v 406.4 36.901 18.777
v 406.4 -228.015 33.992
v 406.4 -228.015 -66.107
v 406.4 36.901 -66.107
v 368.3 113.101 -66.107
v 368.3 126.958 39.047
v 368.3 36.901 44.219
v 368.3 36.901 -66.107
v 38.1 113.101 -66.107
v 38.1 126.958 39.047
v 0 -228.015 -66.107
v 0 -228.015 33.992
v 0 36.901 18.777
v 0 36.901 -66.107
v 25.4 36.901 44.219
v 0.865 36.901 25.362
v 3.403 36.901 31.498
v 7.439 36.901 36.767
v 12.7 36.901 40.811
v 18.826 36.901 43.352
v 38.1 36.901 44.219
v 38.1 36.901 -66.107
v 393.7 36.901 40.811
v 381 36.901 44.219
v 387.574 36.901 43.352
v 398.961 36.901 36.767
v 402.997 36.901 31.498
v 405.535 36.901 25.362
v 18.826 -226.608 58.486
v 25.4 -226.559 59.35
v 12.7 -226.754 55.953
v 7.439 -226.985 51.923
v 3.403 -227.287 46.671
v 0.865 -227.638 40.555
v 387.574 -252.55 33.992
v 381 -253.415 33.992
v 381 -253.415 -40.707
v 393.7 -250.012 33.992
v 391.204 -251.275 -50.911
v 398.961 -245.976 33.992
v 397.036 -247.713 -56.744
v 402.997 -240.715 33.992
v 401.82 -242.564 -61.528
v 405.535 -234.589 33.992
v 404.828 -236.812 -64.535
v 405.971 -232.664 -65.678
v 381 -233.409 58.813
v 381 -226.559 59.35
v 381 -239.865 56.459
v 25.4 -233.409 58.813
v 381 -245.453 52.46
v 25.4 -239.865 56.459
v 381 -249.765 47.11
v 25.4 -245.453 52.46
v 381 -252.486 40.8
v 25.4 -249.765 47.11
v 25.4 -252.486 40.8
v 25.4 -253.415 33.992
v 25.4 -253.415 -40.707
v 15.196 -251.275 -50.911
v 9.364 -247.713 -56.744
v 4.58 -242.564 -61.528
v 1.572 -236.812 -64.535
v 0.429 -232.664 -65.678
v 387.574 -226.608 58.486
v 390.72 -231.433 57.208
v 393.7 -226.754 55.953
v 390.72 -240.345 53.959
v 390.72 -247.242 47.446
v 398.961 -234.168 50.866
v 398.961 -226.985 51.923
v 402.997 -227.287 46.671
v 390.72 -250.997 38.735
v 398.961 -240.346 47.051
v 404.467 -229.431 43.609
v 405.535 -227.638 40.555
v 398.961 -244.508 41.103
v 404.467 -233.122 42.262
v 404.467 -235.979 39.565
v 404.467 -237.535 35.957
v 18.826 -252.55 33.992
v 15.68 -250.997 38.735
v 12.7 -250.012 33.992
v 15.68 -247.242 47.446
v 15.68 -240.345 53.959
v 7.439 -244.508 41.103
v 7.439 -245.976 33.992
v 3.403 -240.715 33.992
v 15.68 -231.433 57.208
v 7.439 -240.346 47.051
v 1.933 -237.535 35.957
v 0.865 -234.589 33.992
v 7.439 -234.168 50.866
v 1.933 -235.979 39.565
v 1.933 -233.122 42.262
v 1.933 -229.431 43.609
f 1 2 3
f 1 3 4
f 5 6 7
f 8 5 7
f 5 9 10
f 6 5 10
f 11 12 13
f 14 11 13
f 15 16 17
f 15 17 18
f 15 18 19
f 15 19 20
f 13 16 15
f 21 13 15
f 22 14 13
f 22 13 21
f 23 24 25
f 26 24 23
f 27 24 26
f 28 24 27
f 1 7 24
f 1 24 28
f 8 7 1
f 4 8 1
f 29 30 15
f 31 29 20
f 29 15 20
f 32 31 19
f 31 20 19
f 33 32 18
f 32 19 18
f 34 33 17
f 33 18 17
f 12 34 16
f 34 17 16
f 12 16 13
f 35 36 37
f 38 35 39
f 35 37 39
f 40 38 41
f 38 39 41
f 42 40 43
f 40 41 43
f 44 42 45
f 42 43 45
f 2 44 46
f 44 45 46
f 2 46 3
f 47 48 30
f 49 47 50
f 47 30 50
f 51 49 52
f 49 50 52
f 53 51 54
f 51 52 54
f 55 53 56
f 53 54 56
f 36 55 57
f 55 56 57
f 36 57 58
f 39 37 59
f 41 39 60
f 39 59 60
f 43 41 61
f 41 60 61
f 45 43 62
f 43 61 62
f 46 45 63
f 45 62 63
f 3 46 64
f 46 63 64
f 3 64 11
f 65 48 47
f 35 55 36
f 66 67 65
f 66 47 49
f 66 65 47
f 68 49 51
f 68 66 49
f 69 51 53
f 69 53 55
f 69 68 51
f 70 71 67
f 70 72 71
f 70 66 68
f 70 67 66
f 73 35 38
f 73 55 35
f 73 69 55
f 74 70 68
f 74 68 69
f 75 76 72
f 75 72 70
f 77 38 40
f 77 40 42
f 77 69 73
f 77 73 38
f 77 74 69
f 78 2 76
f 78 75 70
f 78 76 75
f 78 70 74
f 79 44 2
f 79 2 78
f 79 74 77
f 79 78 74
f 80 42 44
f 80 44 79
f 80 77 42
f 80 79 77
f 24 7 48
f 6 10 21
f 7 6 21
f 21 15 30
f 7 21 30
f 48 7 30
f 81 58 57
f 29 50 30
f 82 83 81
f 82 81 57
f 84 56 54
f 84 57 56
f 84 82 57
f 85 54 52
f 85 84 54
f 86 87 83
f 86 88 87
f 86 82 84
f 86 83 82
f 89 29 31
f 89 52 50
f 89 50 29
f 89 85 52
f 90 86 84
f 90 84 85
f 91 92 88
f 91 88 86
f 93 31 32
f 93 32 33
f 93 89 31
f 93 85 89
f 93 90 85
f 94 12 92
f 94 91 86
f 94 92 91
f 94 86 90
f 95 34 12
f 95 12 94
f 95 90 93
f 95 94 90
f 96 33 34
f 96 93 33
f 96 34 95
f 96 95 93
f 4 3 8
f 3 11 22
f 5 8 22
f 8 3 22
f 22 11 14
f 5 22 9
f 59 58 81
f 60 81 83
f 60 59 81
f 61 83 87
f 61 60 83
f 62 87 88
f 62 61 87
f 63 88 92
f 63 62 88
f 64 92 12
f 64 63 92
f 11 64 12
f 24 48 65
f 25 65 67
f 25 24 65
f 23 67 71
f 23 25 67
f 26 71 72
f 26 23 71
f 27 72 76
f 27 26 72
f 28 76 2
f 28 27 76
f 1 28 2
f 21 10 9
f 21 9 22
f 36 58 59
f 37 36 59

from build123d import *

# Parameters (mm, degrees)
F1_DEPTH     = 406.4
F2_T1_DEPTH  = 417.5993599931
F2_T3_DEPTH  = 355.6
F2_T5_DEPTH  = 163.5993599931
F2_T7_DEPTH  = 533.4
F2_T12_DEPTH = 25.4
F2_T18_DEPTH = 25.4
F3_W         = 89.2188286402
F3_H         = 154.1103798959
F4_DEPTH     = 127


# Not quite as in the source:
# - a fillet or chamfer that OpenCascade refuses, or shapes differently, is made with other operations: its cross-section is extruded or revolved along the edge and cut away or added
# - a feature names something its author has since deleted; it is built from what else it names


with BuildPart() as f1:
    # F0 (on Right) → F1 (new body)
    with BuildSketch(Plane.YZ):
        Polygon((113.1009757519, -66.1072761975), (126.957971921, 39.0469668974), (-253.4152170727, 60.8927238025), (-253.4152170727, -66.1072761975), align=None)
    extrude(amount=F1_DEPTH)

    # F2: fillet of radius 25.4 on 6 edges, made by hand

    # F2_s2 → F2_t1 (cut)
    with BuildSketch(Plane(origin=(0, 187.7009218342, -10.780120229), x_dir=(1, 0, 0), z_dir=(0, -0.9983548268, 0.0573379446))):
        with BuildLine():
            ThreePointArc((25.4, 46.2622370369), (7.4394877579, 38.822749279), (0, 20.8622370369))
            Line((0, 20.8622370369), (0, 46.2622370369))
            Line((0, 46.2622370369), (25.4, 46.2622370369))
        make_face()
        with BuildLine():
            ThreePointArc((381, 46.2622370369), (398.9605122421, 38.822749279), (406.4, 20.8622370369))
            Line((406.4, 20.8622370369), (406.4, 46.2622370369))
            Line((406.4, 46.2622370369), (381, 46.2622370369))
        make_face()
    extrude(amount=F2_T1_DEPTH, mode=Mode.SUBTRACT)

    # F2_s4 → F2_t3 (cut)
    with BuildSketch(Plane.YZ.offset(25.4)):
        with BuildLine():
            ThreePointArc((-226.558833279, 59.3502963952), (-245.4532194187, 52.4603288172), (-253.4152170727, 33.9920837956))
            Line((-253.4152170727, 33.9920837956), (-253.4152170727, 60.8927238025))
            Line((-253.4152170727, 60.8927238025), (-226.558833279, 59.3502963952))
        make_face()
    extrude(amount=F2_T3_DEPTH, mode=Mode.SUBTRACT)

    # F2_s6 → F2_t5 (cut)
    with BuildSketch(Plane.XY.offset(-129.6072761975)):
        with BuildLine():
            ThreePointArc((25.4, -253.4152170727), (7.4394877579, -245.9757293148), (0, -228.0152170727))
            Line((0, -228.0152170727), (0, -253.4152170727))
            Line((0, -253.4152170727), (25.4, -253.4152170727))
        make_face()
        with BuildLine():
            ThreePointArc((381, -253.4152170727), (398.9605122421, -245.9757293148), (406.4, -228.0152170727))
            Line((406.4, -228.0152170727), (406.4, -253.4152170727))
            Line((406.4, -253.4152170727), (381, -253.4152170727))
        make_face()
    extrude(amount=F2_T5_DEPTH, mode=Mode.SUBTRACT)

    # F2_s8 → F2_t7 (cut)
    with BuildSketch(Plane.YZ.offset(-63.5)):
        with BuildLine():
            ThreePointArc((-253.4152170727, -40.7072761975), (-245.9757293148, -58.6677884397), (-228.0152170727, -66.1072761975))
            Line((-228.0152170727, -66.1072761975), (-253.4152170727, -66.1072761975))
            Line((-253.4152170727, -66.1072761975), (-253.4152170727, -40.7072761975))
        make_face()
    extrude(amount=F2_T7_DEPTH, mode=Mode.SUBTRACT)


with BuildPart() as f2_tool10:
    # F2_s11 → F2_t12 (new body)
    with BuildSketch(Plane.YZ.offset(25.4)):
        Polygon((-228.0152170727, 33.9920837956), (-226.558833279, 59.3502963952), (-253.4152170727, 60.8927238025), (-253.4152170727, 33.9920837956), align=None)
    extrude(amount=-F2_T12_DEPTH)

    # F2_s13 → F2_t14 (revolve, cut)
    with BuildSketch(Plane(origin=(25.4, -228.0152170727, 33.9920837956), x_dir=(0, 0.6865355254, -0.7270962607), z_dir=(0, 0.7270962607, 0.6865355254))):
        with BuildLine():
            ThreePointArc((0, -25.4), (25.4, 0), (0, 25.4))
            Line((0, 25.4), (0, -25.4))
        make_face()
    revolve(axis=Axis((25.4, -228.0152170727, 33.9920837956), (-1, 0, 0)), mode=Mode.SUBTRACT)


with BuildPart() as f1_1:
    add(f1.part)

    # F2_t9: cut F2_tool10
    add(f2_tool10.part, mode=Mode.SUBTRACT)


with BuildPart() as f2_tool16:
    # F2_s17 → F2_t18 (new body)
    with BuildSketch(Plane.YZ.offset(381)):
        Polygon((-228.0152170727, 33.9920837956), (-226.558833279, 59.3502963952), (-253.4152170727, 60.8927238025), (-253.4152170727, 33.9920837956), align=None)
    extrude(amount=F2_T18_DEPTH)

    # F2_s19 → F2_t20 (revolve, cut)
    with BuildSketch(Plane(origin=(381, -228.0152170727, 33.9920837956), x_dir=(0, 0.6865355254, -0.7270962607), z_dir=(0, -0.7270962607, -0.6865355254))):
        with BuildLine():
            ThreePointArc((0, -25.4), (25.4, 0), (0, 25.4))
            Line((0, 25.4), (0, -25.4))
        make_face()
    revolve(axis=Axis((381, -228.0152170727, 33.9920837956), (1, 0, 0)), mode=Mode.SUBTRACT)


with BuildPart() as f1_2:
    add(f1_1.part)

    # F2_t15: cut F2_tool16
    add(f2_tool16.part, mode=Mode.SUBTRACT)

    # F3 (on face) → F4 (cut)
    with BuildSketch(Plane(origin=(0, 0, -66.1072761975), x_dir=(1, 0, 0), z_dir=(0, 0, -1))):
        with Locations((-6.5094143201, -113.9561656998)):
            Rectangle(F3_W, F3_H)
        with Locations((412.9094143201, -113.9561656998)):
            Rectangle(F3_W, F3_H)
    extrude(amount=-F4_DEPTH, mode=Mode.SUBTRACT)


solid = f1_2.part
